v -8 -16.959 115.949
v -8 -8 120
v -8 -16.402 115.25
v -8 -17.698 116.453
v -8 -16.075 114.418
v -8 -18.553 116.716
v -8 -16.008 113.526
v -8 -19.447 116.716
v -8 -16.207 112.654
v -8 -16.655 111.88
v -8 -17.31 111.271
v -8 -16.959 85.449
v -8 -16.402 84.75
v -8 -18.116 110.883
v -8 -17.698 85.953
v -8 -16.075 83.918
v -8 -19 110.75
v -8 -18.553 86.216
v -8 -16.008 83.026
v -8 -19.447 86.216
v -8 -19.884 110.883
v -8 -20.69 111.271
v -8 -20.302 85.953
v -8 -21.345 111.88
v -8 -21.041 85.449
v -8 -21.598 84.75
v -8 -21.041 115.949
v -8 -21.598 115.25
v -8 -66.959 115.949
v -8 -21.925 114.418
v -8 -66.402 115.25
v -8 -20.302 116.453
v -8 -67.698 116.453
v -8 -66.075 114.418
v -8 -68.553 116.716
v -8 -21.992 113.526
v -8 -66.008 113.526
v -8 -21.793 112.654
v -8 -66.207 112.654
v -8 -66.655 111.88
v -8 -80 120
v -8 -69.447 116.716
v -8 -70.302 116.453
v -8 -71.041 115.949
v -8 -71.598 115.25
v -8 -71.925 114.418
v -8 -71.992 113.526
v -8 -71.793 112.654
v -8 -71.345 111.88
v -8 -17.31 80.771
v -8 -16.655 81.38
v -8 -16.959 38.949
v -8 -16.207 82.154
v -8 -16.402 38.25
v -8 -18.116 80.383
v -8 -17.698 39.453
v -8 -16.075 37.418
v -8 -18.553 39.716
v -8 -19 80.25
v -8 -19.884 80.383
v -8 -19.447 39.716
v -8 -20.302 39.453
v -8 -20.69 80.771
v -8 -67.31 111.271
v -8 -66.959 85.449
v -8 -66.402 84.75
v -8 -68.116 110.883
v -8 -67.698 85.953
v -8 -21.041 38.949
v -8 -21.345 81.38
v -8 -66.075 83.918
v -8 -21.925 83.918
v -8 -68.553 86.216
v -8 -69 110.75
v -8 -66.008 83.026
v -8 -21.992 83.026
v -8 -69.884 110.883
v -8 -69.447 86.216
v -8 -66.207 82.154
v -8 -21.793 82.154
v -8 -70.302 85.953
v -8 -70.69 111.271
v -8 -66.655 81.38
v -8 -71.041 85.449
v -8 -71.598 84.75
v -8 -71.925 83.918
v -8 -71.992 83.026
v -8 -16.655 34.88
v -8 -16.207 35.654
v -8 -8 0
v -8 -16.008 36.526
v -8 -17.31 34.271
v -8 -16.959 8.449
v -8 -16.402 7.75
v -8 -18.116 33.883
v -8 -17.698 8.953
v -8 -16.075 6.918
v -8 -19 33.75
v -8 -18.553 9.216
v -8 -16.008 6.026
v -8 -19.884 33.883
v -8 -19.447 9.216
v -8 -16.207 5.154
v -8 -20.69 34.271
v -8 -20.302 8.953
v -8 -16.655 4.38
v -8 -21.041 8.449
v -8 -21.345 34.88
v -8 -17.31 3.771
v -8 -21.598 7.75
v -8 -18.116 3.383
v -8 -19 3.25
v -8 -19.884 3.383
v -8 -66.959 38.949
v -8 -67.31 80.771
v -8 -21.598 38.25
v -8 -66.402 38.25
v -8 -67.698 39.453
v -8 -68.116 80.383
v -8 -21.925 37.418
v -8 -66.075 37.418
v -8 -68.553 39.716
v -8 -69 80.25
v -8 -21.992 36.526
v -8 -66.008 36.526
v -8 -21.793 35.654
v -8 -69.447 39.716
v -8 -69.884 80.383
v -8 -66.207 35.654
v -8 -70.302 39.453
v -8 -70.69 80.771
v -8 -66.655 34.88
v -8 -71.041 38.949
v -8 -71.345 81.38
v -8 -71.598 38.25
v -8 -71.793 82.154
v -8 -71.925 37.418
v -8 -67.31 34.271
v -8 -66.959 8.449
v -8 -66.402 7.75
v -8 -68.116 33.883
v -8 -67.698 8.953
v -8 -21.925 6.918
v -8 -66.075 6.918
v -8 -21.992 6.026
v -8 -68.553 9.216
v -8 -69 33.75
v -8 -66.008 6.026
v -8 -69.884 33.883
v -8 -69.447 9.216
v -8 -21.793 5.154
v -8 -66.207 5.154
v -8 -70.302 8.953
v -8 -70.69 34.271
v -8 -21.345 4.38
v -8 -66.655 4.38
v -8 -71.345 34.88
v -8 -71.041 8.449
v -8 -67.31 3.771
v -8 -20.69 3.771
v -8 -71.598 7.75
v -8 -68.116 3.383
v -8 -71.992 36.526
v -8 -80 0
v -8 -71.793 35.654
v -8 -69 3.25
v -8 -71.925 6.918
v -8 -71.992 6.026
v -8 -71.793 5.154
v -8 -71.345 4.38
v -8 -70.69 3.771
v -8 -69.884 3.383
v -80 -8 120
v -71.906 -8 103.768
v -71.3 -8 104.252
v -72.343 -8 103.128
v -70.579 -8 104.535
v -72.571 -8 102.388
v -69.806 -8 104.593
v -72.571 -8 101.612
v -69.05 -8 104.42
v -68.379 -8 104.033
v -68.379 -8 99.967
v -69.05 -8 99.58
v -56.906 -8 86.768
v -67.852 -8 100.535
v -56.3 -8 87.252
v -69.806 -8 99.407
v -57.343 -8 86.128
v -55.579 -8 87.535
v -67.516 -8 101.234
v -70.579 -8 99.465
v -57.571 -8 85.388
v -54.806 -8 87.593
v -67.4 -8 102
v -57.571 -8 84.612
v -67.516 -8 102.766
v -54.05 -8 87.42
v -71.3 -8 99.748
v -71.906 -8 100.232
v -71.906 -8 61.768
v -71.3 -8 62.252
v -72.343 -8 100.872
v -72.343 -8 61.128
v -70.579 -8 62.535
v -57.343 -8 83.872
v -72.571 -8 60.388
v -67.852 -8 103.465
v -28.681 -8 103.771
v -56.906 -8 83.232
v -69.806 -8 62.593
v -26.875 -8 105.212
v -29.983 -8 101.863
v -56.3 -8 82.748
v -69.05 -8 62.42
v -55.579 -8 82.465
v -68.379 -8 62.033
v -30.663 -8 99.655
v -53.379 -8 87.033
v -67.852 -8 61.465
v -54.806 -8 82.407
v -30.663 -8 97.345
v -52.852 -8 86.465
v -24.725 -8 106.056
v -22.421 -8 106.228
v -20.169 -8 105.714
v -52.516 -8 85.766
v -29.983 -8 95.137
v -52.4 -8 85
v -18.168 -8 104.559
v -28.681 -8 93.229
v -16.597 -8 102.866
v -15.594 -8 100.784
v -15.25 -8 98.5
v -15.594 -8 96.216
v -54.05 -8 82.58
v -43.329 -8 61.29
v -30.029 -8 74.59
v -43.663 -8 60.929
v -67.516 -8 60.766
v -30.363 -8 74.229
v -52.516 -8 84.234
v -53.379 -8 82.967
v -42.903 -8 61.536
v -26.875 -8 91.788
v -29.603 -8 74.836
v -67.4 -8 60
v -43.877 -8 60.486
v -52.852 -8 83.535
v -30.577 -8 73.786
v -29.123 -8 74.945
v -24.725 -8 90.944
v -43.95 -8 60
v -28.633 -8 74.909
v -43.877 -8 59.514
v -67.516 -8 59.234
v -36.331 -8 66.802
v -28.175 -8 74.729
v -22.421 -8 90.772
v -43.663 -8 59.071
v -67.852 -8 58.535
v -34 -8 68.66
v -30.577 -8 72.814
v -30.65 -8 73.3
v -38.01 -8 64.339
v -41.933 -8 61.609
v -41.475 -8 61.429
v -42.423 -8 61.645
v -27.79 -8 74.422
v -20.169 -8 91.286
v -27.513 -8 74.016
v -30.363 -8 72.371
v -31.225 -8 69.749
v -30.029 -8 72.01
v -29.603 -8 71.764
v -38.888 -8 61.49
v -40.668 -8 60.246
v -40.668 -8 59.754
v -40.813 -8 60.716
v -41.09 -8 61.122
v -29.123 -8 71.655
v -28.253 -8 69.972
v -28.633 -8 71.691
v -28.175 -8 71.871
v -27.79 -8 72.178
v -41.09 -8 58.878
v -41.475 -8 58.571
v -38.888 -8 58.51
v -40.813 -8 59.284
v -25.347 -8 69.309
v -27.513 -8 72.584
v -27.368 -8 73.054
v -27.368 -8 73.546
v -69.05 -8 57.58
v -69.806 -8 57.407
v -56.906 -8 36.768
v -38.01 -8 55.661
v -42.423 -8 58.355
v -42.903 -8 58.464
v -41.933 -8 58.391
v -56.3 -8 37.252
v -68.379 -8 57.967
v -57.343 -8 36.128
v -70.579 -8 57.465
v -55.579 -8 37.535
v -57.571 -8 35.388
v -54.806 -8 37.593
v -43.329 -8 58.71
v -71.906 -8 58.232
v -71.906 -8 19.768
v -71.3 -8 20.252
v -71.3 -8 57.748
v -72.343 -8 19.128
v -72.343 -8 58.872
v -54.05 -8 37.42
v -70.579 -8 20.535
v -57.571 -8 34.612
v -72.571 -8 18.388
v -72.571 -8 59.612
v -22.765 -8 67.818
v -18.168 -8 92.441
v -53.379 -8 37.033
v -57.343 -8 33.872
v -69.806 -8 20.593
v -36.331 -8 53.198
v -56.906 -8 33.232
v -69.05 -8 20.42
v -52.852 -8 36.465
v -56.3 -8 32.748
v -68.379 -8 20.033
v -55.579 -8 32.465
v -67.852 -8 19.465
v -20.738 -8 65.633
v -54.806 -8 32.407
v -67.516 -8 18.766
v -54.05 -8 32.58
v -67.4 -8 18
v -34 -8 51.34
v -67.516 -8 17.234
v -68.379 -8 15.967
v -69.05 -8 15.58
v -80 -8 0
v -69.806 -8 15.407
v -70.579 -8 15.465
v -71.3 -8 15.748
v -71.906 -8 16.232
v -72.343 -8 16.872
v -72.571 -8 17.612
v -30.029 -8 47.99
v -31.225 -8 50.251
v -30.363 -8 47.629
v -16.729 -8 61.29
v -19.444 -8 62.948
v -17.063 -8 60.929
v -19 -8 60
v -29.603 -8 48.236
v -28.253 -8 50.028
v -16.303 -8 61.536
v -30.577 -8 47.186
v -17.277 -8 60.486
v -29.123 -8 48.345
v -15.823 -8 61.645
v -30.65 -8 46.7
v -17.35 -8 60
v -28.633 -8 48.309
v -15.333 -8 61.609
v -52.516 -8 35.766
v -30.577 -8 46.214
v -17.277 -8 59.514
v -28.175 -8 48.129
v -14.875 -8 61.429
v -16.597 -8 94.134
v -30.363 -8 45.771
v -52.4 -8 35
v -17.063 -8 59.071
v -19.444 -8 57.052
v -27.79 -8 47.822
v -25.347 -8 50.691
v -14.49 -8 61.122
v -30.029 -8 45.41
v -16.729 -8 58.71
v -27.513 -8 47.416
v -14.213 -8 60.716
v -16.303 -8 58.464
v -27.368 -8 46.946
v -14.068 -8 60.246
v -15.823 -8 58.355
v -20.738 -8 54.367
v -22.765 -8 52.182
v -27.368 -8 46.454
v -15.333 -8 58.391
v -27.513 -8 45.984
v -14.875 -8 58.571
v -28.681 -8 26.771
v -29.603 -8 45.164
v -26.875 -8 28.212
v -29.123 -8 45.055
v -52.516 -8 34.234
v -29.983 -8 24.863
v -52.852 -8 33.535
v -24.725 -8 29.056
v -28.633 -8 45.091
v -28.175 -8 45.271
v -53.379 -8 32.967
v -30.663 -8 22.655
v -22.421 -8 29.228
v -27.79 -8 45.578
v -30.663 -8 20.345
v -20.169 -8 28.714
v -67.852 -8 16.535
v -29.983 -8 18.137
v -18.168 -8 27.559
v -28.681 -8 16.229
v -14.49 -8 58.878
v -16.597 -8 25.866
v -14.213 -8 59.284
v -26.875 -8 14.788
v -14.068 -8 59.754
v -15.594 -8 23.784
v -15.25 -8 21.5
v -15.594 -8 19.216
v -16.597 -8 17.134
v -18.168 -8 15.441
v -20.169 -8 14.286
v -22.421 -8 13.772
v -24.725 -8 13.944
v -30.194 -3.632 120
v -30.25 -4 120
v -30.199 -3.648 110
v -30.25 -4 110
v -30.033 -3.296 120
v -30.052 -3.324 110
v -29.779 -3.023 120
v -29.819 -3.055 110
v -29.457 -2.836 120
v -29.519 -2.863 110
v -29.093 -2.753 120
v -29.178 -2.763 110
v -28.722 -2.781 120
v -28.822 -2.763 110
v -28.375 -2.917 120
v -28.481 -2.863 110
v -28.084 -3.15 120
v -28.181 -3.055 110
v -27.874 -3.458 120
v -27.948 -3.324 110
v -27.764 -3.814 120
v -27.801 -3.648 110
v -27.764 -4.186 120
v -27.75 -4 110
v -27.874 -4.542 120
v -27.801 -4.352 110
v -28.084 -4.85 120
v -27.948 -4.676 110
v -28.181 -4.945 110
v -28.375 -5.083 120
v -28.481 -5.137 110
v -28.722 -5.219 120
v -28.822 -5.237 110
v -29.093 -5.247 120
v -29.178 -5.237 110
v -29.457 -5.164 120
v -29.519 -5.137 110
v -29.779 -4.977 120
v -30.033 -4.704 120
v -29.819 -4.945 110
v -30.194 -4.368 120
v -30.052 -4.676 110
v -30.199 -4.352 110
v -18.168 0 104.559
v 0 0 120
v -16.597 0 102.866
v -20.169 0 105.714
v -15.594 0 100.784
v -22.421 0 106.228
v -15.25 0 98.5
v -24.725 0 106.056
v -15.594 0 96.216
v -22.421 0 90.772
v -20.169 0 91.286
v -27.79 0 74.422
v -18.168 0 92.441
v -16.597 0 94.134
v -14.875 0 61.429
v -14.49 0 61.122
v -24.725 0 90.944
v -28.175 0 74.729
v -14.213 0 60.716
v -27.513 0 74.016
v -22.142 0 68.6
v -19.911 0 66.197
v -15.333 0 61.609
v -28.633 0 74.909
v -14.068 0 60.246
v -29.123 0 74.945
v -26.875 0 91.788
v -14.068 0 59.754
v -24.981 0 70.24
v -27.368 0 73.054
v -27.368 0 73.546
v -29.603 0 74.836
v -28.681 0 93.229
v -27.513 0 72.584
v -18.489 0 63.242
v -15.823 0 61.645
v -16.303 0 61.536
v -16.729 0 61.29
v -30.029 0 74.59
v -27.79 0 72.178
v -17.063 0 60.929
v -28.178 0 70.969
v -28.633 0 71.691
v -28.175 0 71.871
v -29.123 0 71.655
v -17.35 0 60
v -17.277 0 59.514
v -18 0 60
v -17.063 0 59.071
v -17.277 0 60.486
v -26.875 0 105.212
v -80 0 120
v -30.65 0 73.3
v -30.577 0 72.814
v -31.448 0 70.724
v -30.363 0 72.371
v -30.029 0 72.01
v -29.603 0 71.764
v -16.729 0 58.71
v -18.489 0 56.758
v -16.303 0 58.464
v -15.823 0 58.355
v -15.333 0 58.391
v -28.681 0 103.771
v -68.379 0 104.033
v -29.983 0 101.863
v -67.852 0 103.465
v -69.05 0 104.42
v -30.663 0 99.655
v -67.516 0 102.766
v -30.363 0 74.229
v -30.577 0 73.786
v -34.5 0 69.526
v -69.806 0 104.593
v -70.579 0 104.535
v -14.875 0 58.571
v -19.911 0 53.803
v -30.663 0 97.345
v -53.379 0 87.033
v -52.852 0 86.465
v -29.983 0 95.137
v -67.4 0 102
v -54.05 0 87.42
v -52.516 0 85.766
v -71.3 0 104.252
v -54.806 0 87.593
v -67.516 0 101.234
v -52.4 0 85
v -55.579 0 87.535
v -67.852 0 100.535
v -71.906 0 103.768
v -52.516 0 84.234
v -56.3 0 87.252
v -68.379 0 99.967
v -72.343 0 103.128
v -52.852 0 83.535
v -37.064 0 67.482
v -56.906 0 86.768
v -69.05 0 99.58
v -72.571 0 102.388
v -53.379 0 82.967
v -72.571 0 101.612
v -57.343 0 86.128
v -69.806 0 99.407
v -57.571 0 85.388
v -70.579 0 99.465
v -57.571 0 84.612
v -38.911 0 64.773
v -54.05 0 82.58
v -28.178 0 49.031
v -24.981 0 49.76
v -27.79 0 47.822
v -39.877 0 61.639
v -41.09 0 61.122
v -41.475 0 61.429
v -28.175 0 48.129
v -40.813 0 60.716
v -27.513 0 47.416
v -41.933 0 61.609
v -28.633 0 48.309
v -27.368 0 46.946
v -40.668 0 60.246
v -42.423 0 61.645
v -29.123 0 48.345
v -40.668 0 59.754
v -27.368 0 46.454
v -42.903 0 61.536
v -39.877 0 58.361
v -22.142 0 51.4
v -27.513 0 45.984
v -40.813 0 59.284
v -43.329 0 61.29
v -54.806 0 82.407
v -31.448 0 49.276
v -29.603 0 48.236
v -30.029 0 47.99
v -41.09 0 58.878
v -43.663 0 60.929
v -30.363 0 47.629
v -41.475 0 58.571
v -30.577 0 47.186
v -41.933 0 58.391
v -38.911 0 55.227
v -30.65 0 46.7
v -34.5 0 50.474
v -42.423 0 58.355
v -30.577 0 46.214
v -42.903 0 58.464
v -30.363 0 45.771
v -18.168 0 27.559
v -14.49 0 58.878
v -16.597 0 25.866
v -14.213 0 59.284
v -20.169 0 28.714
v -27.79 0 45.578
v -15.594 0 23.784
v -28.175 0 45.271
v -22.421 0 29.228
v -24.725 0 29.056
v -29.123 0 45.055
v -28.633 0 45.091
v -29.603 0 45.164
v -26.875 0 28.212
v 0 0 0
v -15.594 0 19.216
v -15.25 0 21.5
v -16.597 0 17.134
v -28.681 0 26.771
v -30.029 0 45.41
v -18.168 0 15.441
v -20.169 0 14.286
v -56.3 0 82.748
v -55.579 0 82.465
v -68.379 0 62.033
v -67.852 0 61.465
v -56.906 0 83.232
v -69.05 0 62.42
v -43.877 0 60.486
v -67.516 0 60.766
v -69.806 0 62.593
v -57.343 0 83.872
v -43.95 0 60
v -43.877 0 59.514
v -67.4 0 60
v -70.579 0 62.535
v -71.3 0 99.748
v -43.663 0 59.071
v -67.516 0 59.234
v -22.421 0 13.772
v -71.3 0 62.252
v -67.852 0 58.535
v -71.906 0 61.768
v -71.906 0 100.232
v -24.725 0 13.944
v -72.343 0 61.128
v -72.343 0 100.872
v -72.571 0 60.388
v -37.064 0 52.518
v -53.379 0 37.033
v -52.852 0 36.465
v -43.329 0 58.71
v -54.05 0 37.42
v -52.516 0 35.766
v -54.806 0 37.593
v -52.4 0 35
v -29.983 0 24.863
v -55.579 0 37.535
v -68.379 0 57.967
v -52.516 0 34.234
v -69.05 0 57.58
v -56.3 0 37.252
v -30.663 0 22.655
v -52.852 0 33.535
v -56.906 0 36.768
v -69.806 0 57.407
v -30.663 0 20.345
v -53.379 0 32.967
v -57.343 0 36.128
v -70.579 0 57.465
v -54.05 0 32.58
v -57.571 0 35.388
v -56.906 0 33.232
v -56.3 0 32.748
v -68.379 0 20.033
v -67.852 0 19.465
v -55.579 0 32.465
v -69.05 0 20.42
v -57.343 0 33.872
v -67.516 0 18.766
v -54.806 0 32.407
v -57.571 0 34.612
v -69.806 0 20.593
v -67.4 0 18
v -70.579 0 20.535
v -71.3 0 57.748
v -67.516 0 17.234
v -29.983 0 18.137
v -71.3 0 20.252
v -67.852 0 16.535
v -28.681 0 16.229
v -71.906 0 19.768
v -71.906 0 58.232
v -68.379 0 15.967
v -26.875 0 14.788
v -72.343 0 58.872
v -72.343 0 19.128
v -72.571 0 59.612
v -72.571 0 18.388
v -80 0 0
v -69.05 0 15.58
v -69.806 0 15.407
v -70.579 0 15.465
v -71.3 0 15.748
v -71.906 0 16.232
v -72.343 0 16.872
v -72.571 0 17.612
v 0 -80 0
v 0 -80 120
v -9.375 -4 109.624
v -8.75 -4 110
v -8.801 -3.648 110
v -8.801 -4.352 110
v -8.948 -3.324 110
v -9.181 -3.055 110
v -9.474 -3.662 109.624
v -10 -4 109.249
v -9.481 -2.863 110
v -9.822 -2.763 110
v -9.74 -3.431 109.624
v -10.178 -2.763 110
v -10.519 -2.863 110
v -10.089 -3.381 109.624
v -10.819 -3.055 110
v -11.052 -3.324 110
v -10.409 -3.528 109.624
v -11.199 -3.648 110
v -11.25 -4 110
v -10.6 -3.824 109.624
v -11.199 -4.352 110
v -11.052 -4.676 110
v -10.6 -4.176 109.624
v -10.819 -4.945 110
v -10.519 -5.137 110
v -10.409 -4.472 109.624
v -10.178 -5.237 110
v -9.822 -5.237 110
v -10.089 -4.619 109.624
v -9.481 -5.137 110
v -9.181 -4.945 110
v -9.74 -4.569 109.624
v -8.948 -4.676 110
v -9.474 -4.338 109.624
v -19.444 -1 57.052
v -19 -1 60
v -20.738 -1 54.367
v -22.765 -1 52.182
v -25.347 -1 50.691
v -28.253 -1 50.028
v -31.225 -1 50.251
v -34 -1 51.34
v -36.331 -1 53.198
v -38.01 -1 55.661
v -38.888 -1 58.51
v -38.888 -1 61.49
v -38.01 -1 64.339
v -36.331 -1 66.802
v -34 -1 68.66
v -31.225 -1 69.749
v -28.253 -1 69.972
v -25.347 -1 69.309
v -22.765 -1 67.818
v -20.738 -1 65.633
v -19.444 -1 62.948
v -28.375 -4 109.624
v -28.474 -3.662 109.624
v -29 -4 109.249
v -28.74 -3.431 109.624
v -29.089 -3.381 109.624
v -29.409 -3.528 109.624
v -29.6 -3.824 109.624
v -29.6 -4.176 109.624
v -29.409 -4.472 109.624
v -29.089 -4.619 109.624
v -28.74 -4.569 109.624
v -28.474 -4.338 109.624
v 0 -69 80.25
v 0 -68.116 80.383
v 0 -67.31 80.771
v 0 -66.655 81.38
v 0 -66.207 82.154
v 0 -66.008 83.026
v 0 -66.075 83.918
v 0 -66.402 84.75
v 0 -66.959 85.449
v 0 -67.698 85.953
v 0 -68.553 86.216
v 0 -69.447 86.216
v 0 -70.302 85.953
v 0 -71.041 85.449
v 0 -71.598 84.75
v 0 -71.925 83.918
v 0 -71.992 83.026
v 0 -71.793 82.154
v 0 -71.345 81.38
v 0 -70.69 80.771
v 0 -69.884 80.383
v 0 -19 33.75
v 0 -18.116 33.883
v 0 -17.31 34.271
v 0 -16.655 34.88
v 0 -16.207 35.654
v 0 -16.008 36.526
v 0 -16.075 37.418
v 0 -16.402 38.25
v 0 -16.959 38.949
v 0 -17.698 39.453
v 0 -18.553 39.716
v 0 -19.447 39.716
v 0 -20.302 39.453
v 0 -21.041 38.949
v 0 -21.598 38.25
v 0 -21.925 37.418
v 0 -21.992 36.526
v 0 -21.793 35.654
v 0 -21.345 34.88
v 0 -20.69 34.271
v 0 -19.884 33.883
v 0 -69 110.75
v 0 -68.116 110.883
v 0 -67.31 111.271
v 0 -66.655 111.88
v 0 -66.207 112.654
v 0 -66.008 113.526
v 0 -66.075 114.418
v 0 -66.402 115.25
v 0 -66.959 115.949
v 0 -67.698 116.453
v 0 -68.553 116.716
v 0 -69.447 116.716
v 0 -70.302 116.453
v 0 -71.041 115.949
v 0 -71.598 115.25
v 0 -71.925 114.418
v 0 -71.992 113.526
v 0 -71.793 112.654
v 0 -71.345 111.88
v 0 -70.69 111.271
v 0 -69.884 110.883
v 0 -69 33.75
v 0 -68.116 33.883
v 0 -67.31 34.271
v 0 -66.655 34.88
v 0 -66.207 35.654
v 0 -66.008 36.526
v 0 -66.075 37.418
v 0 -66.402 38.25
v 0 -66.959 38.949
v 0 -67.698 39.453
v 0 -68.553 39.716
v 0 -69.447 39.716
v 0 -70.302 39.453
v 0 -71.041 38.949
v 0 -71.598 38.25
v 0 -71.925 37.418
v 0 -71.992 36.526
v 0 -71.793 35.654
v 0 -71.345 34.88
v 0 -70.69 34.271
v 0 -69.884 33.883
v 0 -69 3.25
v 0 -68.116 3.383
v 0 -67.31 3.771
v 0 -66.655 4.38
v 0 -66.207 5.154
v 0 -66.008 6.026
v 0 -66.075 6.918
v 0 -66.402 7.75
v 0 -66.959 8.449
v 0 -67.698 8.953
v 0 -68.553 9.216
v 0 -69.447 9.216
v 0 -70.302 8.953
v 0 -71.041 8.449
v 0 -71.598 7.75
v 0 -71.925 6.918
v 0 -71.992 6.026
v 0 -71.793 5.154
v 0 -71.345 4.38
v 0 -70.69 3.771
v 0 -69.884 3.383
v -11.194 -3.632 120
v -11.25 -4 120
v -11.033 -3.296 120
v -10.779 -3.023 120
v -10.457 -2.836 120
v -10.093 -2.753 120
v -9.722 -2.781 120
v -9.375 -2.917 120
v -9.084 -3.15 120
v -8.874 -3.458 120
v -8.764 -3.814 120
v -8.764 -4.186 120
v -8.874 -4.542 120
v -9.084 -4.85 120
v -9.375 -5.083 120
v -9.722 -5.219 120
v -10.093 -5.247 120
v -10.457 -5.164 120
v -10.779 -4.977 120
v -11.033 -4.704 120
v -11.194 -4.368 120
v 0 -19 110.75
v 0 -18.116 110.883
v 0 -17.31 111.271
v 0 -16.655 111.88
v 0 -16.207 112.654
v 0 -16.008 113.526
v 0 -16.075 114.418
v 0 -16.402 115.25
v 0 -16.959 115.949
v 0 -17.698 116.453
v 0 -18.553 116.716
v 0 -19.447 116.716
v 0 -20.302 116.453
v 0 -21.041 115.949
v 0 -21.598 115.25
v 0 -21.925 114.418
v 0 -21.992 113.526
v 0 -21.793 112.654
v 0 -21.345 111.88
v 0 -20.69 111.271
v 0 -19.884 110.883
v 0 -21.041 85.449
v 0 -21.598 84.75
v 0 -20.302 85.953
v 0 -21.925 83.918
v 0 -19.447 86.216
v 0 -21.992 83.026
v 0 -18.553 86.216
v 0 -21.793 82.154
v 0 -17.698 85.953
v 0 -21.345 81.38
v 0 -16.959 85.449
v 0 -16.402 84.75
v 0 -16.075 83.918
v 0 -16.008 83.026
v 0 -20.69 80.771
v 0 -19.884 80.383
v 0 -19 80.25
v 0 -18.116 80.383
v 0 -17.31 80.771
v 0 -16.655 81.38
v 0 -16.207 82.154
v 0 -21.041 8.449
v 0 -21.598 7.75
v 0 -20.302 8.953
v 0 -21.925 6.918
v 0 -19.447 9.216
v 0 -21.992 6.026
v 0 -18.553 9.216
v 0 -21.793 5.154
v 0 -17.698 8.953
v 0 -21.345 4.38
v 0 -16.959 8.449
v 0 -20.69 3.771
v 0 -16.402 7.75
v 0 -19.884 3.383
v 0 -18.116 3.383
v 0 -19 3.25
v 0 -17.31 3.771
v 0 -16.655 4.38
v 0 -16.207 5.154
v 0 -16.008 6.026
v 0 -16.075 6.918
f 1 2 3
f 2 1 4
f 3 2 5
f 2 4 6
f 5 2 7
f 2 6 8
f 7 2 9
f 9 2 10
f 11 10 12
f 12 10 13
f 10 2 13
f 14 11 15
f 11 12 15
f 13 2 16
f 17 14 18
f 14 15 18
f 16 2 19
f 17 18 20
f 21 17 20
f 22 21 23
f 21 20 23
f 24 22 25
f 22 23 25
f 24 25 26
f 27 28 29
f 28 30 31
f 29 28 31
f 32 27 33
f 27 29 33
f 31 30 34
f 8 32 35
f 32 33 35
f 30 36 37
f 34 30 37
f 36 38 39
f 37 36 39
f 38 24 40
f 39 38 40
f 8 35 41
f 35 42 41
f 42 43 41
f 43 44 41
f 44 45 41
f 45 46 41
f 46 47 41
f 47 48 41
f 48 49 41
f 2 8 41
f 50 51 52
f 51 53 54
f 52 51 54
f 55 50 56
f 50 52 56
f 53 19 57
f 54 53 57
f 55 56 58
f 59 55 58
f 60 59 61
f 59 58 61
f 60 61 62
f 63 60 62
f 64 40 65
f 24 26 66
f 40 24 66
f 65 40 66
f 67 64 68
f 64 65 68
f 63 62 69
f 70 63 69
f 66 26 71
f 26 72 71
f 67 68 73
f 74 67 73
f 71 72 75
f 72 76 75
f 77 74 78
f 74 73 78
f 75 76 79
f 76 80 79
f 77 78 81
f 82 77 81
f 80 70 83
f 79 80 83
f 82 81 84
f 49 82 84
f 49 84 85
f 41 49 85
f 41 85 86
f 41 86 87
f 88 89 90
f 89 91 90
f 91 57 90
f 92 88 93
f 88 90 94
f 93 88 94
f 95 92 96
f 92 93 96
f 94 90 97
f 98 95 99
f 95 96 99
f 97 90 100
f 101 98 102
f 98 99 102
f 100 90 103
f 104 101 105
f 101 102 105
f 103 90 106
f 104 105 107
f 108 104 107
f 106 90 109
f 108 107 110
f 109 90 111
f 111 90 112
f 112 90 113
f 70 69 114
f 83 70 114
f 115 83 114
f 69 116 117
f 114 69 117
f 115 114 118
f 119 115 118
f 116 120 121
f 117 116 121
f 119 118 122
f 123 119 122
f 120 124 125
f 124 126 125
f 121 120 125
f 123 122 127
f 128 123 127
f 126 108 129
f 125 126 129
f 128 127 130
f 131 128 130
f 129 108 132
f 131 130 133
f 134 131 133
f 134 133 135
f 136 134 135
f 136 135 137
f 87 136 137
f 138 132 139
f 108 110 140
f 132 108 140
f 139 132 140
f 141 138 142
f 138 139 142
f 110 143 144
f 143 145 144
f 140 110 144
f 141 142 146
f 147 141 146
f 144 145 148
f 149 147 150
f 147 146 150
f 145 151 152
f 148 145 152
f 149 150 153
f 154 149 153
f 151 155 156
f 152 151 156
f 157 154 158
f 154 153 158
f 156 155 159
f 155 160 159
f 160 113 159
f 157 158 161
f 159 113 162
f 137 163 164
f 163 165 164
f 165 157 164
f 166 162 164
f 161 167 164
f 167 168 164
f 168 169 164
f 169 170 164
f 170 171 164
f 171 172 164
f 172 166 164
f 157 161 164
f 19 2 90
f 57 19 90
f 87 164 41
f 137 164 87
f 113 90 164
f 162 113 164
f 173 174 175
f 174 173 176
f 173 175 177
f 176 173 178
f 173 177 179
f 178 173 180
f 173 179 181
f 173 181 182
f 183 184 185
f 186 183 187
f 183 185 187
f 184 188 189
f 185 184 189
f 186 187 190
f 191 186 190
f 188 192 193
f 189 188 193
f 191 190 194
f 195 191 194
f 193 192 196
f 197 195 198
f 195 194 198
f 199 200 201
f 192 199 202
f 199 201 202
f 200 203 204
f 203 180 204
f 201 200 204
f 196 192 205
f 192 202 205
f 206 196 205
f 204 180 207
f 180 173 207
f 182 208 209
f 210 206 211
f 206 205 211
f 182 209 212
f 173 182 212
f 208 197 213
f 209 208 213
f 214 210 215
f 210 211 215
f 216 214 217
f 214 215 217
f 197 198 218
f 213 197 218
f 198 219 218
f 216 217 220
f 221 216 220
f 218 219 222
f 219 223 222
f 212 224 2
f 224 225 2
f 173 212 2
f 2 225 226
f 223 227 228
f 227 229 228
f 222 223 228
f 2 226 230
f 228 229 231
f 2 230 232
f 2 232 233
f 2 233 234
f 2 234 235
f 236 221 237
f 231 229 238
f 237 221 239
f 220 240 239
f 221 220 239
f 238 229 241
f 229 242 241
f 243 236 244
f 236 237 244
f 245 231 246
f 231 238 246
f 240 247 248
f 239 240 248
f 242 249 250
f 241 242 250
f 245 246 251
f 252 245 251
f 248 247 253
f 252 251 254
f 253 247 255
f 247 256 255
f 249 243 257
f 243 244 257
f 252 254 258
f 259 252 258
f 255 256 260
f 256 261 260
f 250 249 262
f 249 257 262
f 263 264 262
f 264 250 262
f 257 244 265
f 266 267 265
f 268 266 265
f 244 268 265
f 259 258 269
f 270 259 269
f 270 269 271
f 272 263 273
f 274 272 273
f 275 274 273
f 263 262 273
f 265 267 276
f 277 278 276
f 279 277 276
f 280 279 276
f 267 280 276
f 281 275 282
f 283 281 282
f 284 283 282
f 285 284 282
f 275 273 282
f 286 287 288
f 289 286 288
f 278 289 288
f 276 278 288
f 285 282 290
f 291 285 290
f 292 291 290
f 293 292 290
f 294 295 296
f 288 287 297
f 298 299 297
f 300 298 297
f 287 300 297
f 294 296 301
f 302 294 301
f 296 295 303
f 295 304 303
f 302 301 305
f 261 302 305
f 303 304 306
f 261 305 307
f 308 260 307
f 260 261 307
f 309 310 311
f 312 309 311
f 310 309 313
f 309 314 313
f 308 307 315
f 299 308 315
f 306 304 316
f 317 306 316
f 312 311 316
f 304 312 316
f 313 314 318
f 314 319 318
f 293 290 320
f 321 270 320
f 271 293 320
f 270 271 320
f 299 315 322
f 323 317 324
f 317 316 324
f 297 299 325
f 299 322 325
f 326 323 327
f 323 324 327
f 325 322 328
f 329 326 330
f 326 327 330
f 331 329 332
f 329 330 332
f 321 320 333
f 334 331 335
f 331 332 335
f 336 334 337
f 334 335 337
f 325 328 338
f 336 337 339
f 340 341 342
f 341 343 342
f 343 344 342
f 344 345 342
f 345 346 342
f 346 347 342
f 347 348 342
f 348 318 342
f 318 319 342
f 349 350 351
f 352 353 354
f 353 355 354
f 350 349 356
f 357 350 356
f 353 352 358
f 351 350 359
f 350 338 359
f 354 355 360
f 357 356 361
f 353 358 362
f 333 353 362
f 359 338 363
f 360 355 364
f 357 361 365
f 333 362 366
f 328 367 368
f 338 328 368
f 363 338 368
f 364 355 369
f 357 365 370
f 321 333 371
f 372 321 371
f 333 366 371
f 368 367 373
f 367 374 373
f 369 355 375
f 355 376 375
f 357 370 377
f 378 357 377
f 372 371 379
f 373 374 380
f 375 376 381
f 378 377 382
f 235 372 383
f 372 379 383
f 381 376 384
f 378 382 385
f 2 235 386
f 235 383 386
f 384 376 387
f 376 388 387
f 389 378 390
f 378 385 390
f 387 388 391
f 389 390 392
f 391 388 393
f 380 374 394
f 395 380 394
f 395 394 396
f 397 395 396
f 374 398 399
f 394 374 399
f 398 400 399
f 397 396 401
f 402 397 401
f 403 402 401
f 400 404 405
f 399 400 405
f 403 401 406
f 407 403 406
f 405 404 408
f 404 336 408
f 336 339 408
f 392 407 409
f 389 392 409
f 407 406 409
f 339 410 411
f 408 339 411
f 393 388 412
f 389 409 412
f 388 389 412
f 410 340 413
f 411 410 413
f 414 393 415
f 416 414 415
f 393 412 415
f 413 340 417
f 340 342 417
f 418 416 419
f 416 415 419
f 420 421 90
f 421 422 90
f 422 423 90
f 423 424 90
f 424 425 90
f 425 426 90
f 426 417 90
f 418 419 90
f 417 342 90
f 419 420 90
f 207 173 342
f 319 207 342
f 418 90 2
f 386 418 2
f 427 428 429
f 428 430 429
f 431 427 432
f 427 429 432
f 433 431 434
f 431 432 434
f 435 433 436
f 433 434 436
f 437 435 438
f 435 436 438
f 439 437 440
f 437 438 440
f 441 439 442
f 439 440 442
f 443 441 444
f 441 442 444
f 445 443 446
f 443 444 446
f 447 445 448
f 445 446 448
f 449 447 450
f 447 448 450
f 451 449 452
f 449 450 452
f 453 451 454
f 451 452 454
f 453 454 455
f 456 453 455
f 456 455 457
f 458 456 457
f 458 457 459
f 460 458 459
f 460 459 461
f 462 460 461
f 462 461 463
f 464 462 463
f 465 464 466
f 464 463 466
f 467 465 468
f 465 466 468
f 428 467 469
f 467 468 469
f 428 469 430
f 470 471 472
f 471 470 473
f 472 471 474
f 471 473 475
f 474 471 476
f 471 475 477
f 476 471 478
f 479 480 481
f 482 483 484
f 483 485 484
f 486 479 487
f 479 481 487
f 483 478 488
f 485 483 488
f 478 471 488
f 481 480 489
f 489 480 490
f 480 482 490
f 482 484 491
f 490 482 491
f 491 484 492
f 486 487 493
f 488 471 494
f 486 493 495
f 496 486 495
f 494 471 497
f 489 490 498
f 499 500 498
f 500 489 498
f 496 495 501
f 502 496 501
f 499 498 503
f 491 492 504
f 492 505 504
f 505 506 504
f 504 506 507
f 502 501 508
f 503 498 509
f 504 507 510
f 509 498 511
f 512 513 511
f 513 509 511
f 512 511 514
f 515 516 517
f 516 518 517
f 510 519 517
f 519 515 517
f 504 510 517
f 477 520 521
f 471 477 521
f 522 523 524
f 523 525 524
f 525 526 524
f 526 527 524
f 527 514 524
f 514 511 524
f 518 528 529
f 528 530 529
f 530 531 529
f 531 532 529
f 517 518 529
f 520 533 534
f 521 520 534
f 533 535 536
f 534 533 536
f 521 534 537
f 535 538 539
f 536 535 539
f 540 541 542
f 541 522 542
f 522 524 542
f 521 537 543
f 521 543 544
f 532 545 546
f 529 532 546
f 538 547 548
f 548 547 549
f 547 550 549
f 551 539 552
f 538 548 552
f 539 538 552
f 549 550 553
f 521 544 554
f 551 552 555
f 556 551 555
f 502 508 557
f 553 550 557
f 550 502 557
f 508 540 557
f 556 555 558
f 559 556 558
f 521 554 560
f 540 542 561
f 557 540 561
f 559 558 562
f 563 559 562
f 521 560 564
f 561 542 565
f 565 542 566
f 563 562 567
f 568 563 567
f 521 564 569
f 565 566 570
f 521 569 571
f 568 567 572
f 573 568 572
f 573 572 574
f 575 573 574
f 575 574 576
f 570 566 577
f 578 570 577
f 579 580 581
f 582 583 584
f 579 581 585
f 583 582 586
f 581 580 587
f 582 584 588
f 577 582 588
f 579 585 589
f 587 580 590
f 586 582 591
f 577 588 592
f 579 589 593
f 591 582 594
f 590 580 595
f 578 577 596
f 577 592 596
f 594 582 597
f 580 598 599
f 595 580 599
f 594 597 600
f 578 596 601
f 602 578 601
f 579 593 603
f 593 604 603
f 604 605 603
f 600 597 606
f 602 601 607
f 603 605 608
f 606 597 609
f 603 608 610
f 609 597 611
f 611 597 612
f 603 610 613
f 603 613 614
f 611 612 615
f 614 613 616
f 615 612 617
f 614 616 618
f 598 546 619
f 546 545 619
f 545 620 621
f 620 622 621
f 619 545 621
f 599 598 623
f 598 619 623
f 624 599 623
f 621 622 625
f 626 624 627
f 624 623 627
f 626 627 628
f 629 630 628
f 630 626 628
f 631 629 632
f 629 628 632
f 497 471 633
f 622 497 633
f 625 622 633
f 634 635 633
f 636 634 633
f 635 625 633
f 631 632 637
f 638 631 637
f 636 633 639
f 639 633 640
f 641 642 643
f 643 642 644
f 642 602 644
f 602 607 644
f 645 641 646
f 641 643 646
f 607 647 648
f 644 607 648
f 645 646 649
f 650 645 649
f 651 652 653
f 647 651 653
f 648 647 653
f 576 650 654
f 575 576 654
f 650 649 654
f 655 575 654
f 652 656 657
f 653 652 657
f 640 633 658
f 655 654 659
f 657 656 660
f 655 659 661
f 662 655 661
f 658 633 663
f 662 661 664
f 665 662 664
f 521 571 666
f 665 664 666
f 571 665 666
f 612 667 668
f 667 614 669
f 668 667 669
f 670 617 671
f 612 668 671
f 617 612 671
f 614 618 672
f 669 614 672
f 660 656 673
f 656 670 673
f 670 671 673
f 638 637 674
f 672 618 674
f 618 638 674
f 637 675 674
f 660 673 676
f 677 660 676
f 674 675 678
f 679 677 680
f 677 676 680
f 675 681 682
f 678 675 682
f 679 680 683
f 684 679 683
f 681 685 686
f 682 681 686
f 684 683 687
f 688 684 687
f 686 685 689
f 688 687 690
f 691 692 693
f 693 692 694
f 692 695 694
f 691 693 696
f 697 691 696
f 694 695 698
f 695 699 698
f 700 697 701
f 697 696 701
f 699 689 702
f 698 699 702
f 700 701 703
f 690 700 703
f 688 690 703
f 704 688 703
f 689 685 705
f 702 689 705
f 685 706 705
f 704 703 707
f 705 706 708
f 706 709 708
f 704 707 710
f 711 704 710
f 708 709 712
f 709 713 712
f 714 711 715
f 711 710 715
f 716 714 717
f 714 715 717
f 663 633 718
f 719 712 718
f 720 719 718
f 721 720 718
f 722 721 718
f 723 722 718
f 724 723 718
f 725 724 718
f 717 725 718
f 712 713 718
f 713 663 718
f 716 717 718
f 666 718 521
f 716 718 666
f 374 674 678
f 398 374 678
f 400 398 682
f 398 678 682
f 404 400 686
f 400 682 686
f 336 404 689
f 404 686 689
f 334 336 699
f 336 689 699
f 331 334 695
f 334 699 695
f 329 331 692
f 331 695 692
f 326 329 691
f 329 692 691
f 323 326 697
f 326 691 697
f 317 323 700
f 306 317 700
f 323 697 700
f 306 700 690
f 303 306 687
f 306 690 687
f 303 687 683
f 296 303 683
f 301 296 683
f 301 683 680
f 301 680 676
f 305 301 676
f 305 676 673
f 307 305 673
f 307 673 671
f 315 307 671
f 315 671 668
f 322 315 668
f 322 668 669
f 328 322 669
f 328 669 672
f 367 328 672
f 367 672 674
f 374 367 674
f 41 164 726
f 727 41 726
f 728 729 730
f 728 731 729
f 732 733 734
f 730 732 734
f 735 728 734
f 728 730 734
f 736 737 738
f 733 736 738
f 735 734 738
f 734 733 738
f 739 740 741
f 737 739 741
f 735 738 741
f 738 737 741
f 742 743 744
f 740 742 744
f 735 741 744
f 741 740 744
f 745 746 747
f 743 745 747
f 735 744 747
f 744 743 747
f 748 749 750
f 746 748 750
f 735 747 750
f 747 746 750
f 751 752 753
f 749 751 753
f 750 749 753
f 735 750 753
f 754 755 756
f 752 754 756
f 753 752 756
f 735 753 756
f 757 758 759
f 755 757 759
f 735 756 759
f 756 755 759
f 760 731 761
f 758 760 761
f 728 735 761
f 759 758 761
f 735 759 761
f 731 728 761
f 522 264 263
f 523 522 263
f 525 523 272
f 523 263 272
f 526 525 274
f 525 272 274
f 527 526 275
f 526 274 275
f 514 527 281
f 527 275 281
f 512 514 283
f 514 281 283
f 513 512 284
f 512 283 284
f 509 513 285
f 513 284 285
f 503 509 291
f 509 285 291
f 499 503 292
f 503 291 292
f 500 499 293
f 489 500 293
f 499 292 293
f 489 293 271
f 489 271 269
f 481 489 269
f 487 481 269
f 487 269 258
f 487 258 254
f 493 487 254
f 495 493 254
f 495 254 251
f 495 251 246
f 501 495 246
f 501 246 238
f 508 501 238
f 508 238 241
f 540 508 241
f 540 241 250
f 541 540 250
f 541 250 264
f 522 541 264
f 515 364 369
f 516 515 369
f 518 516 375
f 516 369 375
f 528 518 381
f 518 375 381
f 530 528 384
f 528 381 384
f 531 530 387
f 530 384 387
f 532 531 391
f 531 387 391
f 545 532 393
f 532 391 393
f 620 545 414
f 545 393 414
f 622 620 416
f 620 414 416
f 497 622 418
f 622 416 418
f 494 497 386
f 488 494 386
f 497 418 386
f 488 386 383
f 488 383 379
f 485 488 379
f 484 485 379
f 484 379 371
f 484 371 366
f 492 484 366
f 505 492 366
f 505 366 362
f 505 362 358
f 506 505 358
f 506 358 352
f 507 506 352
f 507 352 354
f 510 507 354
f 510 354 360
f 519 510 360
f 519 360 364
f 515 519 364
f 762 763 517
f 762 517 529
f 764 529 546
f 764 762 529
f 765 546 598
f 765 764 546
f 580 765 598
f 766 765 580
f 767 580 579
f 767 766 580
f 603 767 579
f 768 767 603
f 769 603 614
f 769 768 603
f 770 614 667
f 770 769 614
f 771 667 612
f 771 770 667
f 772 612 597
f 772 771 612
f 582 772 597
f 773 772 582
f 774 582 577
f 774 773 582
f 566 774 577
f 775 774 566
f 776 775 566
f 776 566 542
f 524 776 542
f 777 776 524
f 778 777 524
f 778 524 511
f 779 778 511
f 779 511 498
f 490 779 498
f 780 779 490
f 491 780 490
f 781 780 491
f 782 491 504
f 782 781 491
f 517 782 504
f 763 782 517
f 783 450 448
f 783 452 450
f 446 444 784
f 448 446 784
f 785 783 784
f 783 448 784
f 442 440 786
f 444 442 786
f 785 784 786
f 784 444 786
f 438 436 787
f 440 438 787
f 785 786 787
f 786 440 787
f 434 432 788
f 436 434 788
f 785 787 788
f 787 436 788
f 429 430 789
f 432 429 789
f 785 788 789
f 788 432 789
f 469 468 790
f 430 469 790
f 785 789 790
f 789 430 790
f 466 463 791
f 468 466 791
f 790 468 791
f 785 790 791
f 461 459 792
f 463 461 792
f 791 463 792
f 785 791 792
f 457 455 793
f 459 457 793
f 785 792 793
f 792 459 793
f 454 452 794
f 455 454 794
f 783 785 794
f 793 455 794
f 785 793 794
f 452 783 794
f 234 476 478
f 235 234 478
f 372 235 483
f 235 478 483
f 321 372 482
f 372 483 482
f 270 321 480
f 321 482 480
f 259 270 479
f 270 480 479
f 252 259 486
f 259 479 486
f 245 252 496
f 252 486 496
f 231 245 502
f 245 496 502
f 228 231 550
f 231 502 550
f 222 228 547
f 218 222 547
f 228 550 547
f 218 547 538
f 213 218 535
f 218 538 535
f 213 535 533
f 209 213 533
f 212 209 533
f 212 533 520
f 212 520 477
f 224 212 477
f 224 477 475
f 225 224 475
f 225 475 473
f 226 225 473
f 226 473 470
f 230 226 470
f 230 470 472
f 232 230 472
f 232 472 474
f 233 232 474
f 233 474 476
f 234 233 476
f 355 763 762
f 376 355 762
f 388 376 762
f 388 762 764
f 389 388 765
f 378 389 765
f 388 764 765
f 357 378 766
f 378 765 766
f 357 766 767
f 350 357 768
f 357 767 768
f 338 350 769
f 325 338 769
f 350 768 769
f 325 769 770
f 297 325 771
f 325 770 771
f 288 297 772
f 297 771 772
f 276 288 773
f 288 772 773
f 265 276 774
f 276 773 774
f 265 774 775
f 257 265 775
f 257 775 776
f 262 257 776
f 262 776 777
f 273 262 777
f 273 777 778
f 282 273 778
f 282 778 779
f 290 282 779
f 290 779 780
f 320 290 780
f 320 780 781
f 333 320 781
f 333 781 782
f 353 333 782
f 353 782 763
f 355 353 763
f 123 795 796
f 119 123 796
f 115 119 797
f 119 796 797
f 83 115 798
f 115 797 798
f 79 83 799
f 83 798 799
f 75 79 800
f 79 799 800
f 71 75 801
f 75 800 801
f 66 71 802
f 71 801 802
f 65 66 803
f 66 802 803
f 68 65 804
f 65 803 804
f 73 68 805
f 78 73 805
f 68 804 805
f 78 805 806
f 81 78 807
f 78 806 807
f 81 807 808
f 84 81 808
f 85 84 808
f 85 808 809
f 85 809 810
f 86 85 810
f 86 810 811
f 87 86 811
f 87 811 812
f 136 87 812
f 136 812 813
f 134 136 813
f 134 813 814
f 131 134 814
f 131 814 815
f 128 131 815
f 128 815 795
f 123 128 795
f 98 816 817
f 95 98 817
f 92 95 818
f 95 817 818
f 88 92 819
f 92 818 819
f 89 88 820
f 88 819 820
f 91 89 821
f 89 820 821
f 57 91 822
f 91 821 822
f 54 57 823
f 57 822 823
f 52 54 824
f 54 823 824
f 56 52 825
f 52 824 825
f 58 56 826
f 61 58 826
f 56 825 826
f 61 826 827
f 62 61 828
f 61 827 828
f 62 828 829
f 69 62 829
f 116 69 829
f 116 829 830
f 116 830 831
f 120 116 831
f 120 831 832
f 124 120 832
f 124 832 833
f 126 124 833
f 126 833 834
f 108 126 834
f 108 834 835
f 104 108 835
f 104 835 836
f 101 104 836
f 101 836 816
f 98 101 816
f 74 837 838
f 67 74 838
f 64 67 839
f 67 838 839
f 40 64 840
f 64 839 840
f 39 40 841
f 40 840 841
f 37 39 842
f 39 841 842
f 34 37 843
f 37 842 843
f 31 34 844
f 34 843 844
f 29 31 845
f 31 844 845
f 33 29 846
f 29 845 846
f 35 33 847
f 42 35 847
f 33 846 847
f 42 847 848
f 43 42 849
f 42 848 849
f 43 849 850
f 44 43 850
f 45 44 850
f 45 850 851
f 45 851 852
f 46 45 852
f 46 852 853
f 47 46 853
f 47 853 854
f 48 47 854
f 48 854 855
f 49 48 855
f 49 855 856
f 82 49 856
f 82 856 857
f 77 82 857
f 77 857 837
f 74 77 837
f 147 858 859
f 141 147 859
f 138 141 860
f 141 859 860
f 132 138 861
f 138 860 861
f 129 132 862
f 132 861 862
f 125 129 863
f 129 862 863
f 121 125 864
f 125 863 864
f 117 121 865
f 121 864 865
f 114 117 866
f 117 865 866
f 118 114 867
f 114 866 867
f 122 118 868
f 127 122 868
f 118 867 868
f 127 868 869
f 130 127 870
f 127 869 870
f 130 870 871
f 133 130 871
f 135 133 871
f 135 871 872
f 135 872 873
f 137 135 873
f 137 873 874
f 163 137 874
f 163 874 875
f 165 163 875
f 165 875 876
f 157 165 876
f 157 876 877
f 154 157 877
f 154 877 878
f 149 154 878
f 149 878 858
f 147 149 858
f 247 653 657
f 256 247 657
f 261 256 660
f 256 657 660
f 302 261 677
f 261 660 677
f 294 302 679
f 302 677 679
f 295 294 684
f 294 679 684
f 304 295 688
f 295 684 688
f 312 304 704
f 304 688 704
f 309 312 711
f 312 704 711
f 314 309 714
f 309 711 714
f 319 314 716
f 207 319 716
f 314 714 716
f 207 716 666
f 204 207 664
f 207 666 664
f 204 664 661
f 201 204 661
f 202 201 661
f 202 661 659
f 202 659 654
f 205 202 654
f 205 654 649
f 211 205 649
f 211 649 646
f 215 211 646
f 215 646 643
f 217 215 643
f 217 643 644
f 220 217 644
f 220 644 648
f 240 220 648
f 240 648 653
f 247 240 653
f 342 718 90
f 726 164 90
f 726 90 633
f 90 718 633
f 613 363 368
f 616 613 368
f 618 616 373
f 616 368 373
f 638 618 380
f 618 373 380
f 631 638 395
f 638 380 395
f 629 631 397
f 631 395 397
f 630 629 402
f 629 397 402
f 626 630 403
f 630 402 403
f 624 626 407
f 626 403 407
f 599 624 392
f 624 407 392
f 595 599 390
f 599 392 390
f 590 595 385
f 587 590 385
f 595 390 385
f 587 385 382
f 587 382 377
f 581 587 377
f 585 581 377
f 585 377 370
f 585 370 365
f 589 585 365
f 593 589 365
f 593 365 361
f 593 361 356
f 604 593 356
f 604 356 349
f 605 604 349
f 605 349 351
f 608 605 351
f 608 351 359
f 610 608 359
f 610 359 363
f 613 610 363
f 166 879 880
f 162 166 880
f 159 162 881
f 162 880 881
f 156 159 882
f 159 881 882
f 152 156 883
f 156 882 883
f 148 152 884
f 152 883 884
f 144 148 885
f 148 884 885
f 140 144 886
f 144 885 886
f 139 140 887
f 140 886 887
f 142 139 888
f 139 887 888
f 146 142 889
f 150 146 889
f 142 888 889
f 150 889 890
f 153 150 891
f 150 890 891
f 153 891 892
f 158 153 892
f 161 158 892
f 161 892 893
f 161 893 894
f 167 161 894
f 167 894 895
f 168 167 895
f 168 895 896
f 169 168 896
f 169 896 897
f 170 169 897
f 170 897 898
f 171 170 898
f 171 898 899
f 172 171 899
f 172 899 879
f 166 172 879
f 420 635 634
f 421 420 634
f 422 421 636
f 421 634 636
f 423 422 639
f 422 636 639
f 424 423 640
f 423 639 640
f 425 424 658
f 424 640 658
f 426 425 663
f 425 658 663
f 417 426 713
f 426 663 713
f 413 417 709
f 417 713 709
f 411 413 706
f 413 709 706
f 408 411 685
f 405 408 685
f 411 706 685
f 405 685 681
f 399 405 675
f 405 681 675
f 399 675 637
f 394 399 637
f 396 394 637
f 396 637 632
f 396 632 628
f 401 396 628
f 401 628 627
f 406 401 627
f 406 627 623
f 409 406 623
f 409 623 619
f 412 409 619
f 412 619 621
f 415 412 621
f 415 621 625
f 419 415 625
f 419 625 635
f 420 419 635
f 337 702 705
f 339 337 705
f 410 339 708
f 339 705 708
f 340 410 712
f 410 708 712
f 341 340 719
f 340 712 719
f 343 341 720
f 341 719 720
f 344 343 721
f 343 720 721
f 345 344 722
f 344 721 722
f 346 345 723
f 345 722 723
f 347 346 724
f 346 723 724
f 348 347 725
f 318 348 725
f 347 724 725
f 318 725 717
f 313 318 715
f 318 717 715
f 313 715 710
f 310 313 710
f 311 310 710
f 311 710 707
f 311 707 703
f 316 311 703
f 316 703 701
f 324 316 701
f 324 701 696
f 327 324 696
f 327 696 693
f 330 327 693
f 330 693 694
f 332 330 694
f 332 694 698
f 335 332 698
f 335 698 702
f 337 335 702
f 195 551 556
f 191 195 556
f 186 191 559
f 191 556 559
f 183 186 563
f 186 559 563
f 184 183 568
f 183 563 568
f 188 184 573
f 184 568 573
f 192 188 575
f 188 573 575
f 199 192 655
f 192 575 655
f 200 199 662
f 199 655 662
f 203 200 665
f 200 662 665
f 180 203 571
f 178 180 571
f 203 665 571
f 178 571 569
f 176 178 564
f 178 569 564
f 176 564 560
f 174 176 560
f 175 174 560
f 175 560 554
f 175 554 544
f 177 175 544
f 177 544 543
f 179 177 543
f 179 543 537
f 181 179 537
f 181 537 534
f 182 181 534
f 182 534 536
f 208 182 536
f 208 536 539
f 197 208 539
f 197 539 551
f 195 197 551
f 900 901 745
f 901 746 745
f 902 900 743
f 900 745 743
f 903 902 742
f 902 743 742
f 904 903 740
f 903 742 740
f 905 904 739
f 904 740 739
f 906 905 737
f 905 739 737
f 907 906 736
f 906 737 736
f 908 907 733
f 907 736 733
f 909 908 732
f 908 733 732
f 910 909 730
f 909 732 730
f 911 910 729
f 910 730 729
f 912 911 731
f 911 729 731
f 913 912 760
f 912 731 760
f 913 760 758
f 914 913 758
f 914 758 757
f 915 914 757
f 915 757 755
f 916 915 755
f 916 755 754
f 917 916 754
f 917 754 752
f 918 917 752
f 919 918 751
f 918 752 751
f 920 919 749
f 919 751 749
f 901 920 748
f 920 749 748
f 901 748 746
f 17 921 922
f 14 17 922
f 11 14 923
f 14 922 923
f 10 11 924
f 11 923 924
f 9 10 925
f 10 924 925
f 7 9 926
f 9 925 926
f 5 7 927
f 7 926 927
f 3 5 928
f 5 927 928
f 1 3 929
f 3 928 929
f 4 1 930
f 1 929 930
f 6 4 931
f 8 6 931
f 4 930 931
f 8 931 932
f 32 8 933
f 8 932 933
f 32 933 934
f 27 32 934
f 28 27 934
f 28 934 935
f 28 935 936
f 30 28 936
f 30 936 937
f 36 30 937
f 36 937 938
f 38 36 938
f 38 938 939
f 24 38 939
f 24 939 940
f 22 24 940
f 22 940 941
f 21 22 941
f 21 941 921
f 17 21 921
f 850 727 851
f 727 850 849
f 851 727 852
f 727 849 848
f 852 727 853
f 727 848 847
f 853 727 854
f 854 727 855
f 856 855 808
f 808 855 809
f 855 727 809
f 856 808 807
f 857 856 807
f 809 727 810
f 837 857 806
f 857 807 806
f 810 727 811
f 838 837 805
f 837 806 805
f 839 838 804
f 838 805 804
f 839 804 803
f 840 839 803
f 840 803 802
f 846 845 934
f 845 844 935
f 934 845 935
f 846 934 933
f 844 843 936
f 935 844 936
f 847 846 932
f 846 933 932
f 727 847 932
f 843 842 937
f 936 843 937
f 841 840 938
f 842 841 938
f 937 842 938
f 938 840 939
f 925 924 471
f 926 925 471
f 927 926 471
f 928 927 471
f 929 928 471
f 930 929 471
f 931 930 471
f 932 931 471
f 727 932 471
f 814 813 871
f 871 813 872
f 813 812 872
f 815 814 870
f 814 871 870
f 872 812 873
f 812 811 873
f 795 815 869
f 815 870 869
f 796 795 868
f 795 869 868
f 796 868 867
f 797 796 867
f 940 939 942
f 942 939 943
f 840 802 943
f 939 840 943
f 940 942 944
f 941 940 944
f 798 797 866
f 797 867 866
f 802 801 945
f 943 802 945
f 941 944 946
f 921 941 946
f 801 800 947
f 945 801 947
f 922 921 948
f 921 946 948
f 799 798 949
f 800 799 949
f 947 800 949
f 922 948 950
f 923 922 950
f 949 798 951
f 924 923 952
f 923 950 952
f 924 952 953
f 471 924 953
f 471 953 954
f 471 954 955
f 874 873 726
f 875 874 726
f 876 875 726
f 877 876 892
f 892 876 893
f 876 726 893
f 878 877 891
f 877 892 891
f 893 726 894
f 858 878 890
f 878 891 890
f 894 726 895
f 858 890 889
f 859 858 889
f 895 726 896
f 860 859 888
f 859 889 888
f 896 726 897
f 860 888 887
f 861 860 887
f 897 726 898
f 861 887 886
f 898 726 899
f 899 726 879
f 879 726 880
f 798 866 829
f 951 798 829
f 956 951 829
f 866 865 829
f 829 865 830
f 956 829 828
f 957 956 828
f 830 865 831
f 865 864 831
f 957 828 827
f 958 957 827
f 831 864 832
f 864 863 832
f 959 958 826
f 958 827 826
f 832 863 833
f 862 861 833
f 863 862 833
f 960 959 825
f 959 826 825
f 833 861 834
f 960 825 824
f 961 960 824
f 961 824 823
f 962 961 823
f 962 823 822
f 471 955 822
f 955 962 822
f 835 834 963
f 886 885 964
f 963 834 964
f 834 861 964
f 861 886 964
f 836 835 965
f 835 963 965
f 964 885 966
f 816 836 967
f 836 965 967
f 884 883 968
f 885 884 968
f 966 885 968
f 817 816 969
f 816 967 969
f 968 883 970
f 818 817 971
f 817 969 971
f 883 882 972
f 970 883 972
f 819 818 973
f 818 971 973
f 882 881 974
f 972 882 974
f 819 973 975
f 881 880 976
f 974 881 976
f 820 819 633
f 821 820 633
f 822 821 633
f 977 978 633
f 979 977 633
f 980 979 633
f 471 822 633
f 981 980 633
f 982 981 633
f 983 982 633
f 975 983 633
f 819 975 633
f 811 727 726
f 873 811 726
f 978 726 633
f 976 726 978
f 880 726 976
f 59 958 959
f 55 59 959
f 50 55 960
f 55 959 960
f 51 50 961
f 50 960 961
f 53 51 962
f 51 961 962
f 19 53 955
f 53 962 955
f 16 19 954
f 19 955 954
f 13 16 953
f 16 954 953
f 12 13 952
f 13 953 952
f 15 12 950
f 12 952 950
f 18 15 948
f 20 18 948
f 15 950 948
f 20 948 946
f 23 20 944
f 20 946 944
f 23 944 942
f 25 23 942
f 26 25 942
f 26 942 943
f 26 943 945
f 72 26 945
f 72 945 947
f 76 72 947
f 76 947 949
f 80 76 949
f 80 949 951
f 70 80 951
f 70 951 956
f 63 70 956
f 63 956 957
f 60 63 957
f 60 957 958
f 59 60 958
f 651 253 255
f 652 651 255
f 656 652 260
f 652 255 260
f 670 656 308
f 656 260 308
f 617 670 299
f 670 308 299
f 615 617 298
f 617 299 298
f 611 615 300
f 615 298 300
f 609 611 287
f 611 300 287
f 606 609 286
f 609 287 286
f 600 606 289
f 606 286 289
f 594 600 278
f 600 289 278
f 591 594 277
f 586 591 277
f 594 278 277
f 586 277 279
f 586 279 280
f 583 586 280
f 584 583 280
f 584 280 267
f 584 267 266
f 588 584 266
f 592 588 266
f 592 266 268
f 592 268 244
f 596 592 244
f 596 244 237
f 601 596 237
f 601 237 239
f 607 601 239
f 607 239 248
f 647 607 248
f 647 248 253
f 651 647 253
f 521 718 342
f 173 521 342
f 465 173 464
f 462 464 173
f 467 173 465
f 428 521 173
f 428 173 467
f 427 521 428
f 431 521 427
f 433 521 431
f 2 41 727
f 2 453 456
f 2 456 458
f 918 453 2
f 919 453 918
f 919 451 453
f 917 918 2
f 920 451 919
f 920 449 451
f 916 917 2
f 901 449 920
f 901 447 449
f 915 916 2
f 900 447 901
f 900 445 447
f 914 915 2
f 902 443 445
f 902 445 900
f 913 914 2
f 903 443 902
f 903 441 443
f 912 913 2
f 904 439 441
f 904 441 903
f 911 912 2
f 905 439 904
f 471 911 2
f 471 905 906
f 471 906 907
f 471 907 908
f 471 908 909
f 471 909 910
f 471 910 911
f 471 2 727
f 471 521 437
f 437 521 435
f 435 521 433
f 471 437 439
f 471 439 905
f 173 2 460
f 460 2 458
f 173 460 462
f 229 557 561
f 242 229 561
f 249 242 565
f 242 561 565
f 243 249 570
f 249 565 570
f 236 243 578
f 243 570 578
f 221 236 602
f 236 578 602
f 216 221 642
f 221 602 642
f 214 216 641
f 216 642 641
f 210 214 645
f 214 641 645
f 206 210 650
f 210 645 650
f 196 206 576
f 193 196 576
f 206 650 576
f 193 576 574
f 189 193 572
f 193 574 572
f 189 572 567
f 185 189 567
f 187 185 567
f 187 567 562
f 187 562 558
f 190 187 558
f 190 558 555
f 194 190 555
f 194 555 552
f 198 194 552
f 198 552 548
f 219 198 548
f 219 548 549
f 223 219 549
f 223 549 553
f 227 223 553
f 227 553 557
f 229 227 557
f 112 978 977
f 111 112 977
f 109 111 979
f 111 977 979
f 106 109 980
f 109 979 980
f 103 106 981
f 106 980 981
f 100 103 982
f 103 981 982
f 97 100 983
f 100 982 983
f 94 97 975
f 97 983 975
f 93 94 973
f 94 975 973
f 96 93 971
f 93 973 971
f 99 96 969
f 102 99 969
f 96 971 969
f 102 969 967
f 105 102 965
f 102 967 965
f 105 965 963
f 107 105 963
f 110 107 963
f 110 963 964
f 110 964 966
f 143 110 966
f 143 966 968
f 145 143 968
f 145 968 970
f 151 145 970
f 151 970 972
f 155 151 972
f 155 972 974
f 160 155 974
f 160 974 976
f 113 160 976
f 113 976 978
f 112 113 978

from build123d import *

# Parameters (mm, degrees)
ESTRUSIONE_ESTRUSIONE1_DEPTH = 120
TAGLIO_ESTRUSIONE2_REACH     = 82
SCHIZZO6_R                   = 7.75
TAGLIO_ESTRUSIONE3_REACH     = 82
SCHIZZO7_R                   = 10
M4_TAPPED_HOLE1_D            = 3.3
SCHIZZO12_R                  = 3
TAGLIO_ESTRUSIONE4_DEPTH     = 10
SCHIZZO14_R                  = 2.6
TAGLIO_ESTRUSIONE5_DEPTH     = 10
SMUSSO2_SIZE                 = 1
FORO_FILETTATO_M3_1_D        = 2.5
FORO_FILETTATO_M3_1_DEPTH    = 10
FORO_FILETTATO_M3_1_TIP      = 0.751075774


with BuildPart() as part:
    # Schizzo1 → Estrusione-Estrusione1 (new body)
    with BuildSketch(Plane.XY):
        Polygon((0, 0), (-80, 0), (-80, -8), (-8, -8), (-8, -80), (0, -80), align=None)
    extrude(amount=ESTRUSIONE_ESTRUSIONE1_DEPTH)

    # Schizzo6 → Taglio-Estrusione2 (cut, up to next)
    with BuildSketch(Plane(origin=(0, 0, 0), x_dir=(1, 0, 0), z_dir=(0, 1, 0)), mode=Mode.PRIVATE) as taglio_estrusione2_sk1:
        with Locations((-23, -21.5)):
            Circle(SCHIZZO6_R)
    taglio_estrusione2_tool1 = extrude(taglio_estrusione2_sk1.sketch, amount=-TAGLIO_ESTRUSIONE2_REACH, mode=Mode.PRIVATE) & part.part
    add(taglio_estrusione2_tool1.solids().sort_by_distance((-23, 0, 21.5))[0], mode=Mode.SUBTRACT)
    # Schizzo6 → Taglio-Estrusione2 (cut, up to next)
    with BuildSketch(Plane(origin=(0, 0, 0), x_dir=(1, 0, 0), z_dir=(0, 1, 0)), mode=Mode.PRIVATE) as taglio_estrusione2_sk2:
        with Locations((-23, -98.5)):
            Circle(SCHIZZO6_R)
    taglio_estrusione2_tool2 = extrude(taglio_estrusione2_sk2.sketch, amount=-TAGLIO_ESTRUSIONE2_REACH, mode=Mode.PRIVATE) & part.part
    add(taglio_estrusione2_tool2.solids().sort_by_distance((-23, 0, 98.5))[0], mode=Mode.SUBTRACT)

    # Schizzo7 → Taglio-Estrusione3 (cut, up to next)
    with BuildSketch(Plane(origin=(0, 0, 0), x_dir=(1, 0, 0), z_dir=(0, 1, 0)), mode=Mode.PRIVATE) as taglio_estrusione3_sk1:
        with Locations((-29, -60)):
            Circle(SCHIZZO7_R)
    taglio_estrusione3_tool1 = extrude(taglio_estrusione3_sk1.sketch, amount=-TAGLIO_ESTRUSIONE3_REACH, mode=Mode.PRIVATE) & part.part
    add(taglio_estrusione3_tool1.solids().sort_by_distance((-29, 0, 60))[0], mode=Mode.SUBTRACT)

    # M4 Tapped Hole1 (through all)
    with Locations(Plane(origin=(0, 0, 0), x_dir=(1, 0, 0), z_dir=(0, 1, 0))):
        with Locations((-29, -46.7), (-42.3, -60), (-29, -73.3), (-15.7, -60), (-29, -60)):
            Hole(M4_TAPPED_HOLE1_D / 2)

    # Schizzo12 → Taglio-Estrusione4 (cut)
    with BuildSketch(Plane(origin=(0, 0, 0), x_dir=(0, 0, -1), z_dir=(1, 0, 0))):
        with Locations((-113.75, -19)):
            Circle(SCHIZZO12_R)
        with Locations((-83.25, -19)):
            Circle(SCHIZZO12_R)
        with Locations((-36.75, -19)):
            Circle(SCHIZZO12_R)
        with Locations((-6.25, -19)):
            Circle(SCHIZZO12_R)
        with Locations((-83.25, -69)):
            Circle(SCHIZZO12_R)
        with Locations((-113.75, -69)):
            Circle(SCHIZZO12_R)
        with Locations((-6.25, -69)):
            Circle(SCHIZZO12_R)
        with Locations((-36.75, -69)):
            Circle(SCHIZZO12_R)
    extrude(amount=-TAGLIO_ESTRUSIONE4_DEPTH, mode=Mode.SUBTRACT)

    # Schizzo14 → Taglio-Estrusione5 (cut)
    with BuildSketch(Plane(origin=(0, 0, 0), x_dir=(1, 0, 0), z_dir=(0, 1, 0))):
        with Locations((-70, -18)):
            Circle(SCHIZZO14_R)
        with Locations((-70, -60)):
            Circle(SCHIZZO14_R)
        with Locations((-70, -102)):
            Circle(SCHIZZO14_R)
        with Locations((-55, -35)):
            Circle(SCHIZZO14_R)
        with Locations((-55, -85)):
            Circle(SCHIZZO14_R)
    extrude(amount=-TAGLIO_ESTRUSIONE5_DEPTH, mode=Mode.SUBTRACT)

    # Smusso2
    smusso2_edges = [part.edges().sort_by_distance(p)[0] for p in [
        (-39, 0, 60),
    ]]
    chamfer(smusso2_edges, length=SMUSSO2_SIZE)

    # Foro filettato M3-1
    with Locations(Plane.XY.offset(120)):
        with Locations((-10, -4), (-29, -4)):
            Hole(FORO_FILETTATO_M3_1_D / 2, depth=FORO_FILETTATO_M3_1_DEPTH)
            with Locations((0, 0, -(FORO_FILETTATO_M3_1_DEPTH + FORO_FILETTATO_M3_1_TIP / 2))):  # 118° drill point
                Cone(0, FORO_FILETTATO_M3_1_D / 2, FORO_FILETTATO_M3_1_TIP, mode=Mode.SUBTRACT)


solid = part.part
